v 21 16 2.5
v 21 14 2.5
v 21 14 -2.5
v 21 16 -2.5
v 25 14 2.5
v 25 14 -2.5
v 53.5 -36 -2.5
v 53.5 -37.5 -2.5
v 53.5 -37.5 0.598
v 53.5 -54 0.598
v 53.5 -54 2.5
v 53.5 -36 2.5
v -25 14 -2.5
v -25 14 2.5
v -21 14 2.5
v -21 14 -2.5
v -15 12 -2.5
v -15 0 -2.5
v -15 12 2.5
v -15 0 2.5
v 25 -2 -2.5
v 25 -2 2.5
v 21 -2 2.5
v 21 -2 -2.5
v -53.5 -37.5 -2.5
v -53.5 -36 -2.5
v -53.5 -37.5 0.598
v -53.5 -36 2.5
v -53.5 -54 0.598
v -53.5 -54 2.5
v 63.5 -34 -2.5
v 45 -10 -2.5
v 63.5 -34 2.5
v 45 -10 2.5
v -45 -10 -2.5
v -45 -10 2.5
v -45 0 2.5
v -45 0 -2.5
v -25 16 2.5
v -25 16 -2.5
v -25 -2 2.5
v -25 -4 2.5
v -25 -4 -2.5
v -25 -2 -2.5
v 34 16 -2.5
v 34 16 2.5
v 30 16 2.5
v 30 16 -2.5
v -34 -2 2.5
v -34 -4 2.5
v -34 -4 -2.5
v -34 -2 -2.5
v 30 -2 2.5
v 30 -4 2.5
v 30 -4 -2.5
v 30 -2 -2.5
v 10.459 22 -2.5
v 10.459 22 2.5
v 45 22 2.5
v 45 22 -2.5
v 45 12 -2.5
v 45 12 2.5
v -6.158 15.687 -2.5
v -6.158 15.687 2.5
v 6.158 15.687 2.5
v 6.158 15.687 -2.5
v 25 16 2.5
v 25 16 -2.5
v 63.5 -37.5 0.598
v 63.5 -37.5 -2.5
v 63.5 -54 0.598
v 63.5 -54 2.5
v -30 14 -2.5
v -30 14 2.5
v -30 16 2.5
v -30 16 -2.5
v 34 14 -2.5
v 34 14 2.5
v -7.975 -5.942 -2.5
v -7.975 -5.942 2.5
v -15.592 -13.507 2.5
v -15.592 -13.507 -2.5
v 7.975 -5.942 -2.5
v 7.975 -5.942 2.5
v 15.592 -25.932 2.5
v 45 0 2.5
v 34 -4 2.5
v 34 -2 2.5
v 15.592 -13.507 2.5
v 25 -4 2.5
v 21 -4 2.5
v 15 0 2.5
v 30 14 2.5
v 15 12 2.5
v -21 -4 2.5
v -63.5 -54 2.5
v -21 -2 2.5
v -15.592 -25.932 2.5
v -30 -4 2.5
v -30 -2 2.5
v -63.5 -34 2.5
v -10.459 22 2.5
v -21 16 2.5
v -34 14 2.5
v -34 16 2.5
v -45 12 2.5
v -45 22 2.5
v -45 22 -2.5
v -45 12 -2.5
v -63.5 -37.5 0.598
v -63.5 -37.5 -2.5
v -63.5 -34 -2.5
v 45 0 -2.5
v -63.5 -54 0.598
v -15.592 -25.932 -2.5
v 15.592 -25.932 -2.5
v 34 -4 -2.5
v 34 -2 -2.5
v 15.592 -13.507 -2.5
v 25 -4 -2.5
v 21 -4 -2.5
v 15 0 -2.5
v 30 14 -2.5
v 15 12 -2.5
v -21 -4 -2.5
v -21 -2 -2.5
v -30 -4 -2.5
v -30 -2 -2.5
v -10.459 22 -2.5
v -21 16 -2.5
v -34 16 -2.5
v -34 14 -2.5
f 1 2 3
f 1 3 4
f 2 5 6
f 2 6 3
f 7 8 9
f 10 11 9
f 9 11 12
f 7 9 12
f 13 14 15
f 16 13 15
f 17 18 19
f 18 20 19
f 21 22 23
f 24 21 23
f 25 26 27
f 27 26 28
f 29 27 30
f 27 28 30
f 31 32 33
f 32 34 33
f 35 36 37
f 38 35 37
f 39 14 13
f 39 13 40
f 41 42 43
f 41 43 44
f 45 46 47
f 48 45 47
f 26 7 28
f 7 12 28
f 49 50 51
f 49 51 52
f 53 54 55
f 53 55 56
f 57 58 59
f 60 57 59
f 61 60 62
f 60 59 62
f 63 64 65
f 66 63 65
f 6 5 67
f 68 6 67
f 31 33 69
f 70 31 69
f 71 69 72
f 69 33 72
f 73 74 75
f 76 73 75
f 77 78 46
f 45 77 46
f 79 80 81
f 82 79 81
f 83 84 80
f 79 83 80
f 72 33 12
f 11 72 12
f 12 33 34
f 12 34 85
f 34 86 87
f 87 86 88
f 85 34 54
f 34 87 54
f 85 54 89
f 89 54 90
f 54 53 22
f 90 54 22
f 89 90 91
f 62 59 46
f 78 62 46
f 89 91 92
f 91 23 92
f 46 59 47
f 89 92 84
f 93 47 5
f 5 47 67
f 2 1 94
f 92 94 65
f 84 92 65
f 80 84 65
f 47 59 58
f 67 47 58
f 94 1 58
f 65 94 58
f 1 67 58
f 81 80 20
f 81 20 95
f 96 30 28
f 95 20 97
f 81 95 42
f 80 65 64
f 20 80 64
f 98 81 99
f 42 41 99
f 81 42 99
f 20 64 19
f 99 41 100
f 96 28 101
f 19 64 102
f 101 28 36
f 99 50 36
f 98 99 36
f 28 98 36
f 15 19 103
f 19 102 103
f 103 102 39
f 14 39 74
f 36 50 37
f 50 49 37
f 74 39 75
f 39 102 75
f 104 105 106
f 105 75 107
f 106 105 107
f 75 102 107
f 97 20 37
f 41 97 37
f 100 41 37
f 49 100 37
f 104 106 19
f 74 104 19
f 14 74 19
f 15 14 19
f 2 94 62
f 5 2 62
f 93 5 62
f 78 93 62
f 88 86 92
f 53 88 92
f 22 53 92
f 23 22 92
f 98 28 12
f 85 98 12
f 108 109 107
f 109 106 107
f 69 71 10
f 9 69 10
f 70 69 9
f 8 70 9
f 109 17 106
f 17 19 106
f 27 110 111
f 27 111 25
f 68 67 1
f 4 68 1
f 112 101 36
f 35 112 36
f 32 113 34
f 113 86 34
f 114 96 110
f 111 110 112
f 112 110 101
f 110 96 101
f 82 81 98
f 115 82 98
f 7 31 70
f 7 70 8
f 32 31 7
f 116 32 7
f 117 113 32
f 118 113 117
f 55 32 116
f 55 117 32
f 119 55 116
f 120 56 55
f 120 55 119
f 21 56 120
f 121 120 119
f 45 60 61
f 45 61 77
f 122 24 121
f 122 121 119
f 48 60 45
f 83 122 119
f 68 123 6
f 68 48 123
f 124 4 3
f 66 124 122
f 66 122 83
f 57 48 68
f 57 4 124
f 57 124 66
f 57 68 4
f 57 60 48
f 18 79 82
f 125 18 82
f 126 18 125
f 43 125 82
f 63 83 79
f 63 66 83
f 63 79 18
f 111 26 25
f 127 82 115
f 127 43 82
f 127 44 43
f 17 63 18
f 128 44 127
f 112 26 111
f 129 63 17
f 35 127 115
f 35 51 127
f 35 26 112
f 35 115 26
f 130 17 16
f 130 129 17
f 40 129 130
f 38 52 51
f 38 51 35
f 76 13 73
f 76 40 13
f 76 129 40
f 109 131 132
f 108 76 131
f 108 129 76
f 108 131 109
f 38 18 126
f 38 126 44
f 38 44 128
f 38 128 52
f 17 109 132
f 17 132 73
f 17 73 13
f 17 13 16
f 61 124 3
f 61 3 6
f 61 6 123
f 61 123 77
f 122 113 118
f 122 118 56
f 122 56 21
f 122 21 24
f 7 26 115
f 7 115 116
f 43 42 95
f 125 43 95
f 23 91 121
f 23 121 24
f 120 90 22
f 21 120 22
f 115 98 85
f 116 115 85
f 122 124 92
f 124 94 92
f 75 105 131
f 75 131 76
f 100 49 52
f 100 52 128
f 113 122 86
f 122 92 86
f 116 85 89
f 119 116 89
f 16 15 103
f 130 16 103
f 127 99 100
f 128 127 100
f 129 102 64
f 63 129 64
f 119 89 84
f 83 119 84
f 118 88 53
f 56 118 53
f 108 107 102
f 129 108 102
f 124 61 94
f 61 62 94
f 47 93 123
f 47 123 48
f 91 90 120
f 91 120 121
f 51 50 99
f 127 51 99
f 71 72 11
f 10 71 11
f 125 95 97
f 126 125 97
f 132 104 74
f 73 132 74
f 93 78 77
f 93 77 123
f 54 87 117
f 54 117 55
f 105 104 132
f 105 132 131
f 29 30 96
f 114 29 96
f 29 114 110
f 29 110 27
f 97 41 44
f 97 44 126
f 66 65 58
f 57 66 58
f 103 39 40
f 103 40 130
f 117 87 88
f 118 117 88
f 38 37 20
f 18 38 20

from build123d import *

# Parameters (mm, degrees)
PAD005005_DEPTH      = 2.5
SKETCH014_W          = 4
SKETCH014_H          = 2
POCKET003_DEPTH      = 298.676624
POCKET003_DEPTH_BACK = 298.676624
POCKET004_DEPTH      = 2.501
POCKET004_DEPTH_BACK = 2.501
POCKET005_DEPTH      = 2.501
POCKET005_DEPTH_BACK = 2.501
SKETCH017_W          = 10.816708
SKETCH017_H          = 3.71916
POCKET006_DEPTH      = 312.676624


with BuildPart() as part:
    # Sketch013 → Pad005005 (new body, symmetric)
    with BuildSketch(Plane.XY):
        Polygon((-45, 0), (-15, 0), (-15, 12), (-45, 12), (-45, 22), (45, 22), (45, 12), (15, 12), (15, 0), (45, 0), (45, -10), (63.5, -34), (63.5, -54), (53.5, -54), (53.5, -36), (-53.5, -36), (-53.5, -54), (-63.5, -54), (-63.5, -34), (-45, -10), align=None)
    extrude(amount=PAD005005_DEPTH, both=True)

    # Sketch014 → Pocket003 (cut, two sides)
    with BuildSketch(Plane.XY) as pocket003_sk:
        with Locations((-32, -3)):
            Rectangle(SKETCH014_W, SKETCH014_H)
        with Locations((-32, 15)):
            Rectangle(SKETCH014_W, SKETCH014_H)
        with Locations((-23, -3)):
            Rectangle(SKETCH014_W, SKETCH014_H)
        with Locations((-23, 15)):
            Rectangle(SKETCH014_W, SKETCH014_H)
    pocket003 = extrude(amount=-POCKET003_DEPTH, mode=Mode.SUBTRACT) + extrude(pocket003_sk.sketch, amount=POCKET003_DEPTH_BACK, mode=Mode.SUBTRACT)

    # Mirrored002: Pocket003 across Sketch014 V_Axis
    add(pocket003.mirror(Plane(origin=(0, 0, 0), x_dir=(0, 0, 1), z_dir=(1, 0, 0))), mode=Mode.SUBTRACT)

    # Sketch015 → Pocket004 (cut, two sides)
    with BuildSketch(Plane.XY) as pocket004_sk:
        Polygon((-11.314059, 23.254717), (-6.157998, 15.686502), (6.157998, 15.686502), (11.314059, 23.254717), align=None)
    extrude(amount=-POCKET004_DEPTH, mode=Mode.SUBTRACT)
    extrude(pocket004_sk.sketch, amount=POCKET004_DEPTH_BACK, mode=Mode.SUBTRACT)

    # Sketch016 → Pocket005 (cut, two sides)
    with BuildSketch(Plane.XY) as pocket005_sk:
        Polygon((-7.975373, -5.942453), (-15.591735, -13.506808), (-15.591735, -25.932104), (15.591735, -25.932104), (15.591735, -13.506808), (7.975373, -5.942453), align=None)
    extrude(amount=-POCKET005_DEPTH, mode=Mode.SUBTRACT)
    extrude(pocket005_sk.sketch, amount=POCKET005_DEPTH_BACK, mode=Mode.SUBTRACT)

    # Sketch017 → Pocket006 (cut, through all)
    with BuildSketch(Plane.XZ.offset(37.5)):
        with Locations((-58.423876, -1.261529)):
            Rectangle(SKETCH017_W, SKETCH017_H)
    pocket006 = extrude(amount=POCKET006_DEPTH, mode=Mode.SUBTRACT)

    # Mirrored003: Pocket006 across Sketch017 V_Axis
    add(pocket006.mirror(Plane(origin=(0, -37.5, 0), x_dir=(0, -1, 0), z_dir=(1, 0, 0))), mode=Mode.SUBTRACT)


solid = part.part
